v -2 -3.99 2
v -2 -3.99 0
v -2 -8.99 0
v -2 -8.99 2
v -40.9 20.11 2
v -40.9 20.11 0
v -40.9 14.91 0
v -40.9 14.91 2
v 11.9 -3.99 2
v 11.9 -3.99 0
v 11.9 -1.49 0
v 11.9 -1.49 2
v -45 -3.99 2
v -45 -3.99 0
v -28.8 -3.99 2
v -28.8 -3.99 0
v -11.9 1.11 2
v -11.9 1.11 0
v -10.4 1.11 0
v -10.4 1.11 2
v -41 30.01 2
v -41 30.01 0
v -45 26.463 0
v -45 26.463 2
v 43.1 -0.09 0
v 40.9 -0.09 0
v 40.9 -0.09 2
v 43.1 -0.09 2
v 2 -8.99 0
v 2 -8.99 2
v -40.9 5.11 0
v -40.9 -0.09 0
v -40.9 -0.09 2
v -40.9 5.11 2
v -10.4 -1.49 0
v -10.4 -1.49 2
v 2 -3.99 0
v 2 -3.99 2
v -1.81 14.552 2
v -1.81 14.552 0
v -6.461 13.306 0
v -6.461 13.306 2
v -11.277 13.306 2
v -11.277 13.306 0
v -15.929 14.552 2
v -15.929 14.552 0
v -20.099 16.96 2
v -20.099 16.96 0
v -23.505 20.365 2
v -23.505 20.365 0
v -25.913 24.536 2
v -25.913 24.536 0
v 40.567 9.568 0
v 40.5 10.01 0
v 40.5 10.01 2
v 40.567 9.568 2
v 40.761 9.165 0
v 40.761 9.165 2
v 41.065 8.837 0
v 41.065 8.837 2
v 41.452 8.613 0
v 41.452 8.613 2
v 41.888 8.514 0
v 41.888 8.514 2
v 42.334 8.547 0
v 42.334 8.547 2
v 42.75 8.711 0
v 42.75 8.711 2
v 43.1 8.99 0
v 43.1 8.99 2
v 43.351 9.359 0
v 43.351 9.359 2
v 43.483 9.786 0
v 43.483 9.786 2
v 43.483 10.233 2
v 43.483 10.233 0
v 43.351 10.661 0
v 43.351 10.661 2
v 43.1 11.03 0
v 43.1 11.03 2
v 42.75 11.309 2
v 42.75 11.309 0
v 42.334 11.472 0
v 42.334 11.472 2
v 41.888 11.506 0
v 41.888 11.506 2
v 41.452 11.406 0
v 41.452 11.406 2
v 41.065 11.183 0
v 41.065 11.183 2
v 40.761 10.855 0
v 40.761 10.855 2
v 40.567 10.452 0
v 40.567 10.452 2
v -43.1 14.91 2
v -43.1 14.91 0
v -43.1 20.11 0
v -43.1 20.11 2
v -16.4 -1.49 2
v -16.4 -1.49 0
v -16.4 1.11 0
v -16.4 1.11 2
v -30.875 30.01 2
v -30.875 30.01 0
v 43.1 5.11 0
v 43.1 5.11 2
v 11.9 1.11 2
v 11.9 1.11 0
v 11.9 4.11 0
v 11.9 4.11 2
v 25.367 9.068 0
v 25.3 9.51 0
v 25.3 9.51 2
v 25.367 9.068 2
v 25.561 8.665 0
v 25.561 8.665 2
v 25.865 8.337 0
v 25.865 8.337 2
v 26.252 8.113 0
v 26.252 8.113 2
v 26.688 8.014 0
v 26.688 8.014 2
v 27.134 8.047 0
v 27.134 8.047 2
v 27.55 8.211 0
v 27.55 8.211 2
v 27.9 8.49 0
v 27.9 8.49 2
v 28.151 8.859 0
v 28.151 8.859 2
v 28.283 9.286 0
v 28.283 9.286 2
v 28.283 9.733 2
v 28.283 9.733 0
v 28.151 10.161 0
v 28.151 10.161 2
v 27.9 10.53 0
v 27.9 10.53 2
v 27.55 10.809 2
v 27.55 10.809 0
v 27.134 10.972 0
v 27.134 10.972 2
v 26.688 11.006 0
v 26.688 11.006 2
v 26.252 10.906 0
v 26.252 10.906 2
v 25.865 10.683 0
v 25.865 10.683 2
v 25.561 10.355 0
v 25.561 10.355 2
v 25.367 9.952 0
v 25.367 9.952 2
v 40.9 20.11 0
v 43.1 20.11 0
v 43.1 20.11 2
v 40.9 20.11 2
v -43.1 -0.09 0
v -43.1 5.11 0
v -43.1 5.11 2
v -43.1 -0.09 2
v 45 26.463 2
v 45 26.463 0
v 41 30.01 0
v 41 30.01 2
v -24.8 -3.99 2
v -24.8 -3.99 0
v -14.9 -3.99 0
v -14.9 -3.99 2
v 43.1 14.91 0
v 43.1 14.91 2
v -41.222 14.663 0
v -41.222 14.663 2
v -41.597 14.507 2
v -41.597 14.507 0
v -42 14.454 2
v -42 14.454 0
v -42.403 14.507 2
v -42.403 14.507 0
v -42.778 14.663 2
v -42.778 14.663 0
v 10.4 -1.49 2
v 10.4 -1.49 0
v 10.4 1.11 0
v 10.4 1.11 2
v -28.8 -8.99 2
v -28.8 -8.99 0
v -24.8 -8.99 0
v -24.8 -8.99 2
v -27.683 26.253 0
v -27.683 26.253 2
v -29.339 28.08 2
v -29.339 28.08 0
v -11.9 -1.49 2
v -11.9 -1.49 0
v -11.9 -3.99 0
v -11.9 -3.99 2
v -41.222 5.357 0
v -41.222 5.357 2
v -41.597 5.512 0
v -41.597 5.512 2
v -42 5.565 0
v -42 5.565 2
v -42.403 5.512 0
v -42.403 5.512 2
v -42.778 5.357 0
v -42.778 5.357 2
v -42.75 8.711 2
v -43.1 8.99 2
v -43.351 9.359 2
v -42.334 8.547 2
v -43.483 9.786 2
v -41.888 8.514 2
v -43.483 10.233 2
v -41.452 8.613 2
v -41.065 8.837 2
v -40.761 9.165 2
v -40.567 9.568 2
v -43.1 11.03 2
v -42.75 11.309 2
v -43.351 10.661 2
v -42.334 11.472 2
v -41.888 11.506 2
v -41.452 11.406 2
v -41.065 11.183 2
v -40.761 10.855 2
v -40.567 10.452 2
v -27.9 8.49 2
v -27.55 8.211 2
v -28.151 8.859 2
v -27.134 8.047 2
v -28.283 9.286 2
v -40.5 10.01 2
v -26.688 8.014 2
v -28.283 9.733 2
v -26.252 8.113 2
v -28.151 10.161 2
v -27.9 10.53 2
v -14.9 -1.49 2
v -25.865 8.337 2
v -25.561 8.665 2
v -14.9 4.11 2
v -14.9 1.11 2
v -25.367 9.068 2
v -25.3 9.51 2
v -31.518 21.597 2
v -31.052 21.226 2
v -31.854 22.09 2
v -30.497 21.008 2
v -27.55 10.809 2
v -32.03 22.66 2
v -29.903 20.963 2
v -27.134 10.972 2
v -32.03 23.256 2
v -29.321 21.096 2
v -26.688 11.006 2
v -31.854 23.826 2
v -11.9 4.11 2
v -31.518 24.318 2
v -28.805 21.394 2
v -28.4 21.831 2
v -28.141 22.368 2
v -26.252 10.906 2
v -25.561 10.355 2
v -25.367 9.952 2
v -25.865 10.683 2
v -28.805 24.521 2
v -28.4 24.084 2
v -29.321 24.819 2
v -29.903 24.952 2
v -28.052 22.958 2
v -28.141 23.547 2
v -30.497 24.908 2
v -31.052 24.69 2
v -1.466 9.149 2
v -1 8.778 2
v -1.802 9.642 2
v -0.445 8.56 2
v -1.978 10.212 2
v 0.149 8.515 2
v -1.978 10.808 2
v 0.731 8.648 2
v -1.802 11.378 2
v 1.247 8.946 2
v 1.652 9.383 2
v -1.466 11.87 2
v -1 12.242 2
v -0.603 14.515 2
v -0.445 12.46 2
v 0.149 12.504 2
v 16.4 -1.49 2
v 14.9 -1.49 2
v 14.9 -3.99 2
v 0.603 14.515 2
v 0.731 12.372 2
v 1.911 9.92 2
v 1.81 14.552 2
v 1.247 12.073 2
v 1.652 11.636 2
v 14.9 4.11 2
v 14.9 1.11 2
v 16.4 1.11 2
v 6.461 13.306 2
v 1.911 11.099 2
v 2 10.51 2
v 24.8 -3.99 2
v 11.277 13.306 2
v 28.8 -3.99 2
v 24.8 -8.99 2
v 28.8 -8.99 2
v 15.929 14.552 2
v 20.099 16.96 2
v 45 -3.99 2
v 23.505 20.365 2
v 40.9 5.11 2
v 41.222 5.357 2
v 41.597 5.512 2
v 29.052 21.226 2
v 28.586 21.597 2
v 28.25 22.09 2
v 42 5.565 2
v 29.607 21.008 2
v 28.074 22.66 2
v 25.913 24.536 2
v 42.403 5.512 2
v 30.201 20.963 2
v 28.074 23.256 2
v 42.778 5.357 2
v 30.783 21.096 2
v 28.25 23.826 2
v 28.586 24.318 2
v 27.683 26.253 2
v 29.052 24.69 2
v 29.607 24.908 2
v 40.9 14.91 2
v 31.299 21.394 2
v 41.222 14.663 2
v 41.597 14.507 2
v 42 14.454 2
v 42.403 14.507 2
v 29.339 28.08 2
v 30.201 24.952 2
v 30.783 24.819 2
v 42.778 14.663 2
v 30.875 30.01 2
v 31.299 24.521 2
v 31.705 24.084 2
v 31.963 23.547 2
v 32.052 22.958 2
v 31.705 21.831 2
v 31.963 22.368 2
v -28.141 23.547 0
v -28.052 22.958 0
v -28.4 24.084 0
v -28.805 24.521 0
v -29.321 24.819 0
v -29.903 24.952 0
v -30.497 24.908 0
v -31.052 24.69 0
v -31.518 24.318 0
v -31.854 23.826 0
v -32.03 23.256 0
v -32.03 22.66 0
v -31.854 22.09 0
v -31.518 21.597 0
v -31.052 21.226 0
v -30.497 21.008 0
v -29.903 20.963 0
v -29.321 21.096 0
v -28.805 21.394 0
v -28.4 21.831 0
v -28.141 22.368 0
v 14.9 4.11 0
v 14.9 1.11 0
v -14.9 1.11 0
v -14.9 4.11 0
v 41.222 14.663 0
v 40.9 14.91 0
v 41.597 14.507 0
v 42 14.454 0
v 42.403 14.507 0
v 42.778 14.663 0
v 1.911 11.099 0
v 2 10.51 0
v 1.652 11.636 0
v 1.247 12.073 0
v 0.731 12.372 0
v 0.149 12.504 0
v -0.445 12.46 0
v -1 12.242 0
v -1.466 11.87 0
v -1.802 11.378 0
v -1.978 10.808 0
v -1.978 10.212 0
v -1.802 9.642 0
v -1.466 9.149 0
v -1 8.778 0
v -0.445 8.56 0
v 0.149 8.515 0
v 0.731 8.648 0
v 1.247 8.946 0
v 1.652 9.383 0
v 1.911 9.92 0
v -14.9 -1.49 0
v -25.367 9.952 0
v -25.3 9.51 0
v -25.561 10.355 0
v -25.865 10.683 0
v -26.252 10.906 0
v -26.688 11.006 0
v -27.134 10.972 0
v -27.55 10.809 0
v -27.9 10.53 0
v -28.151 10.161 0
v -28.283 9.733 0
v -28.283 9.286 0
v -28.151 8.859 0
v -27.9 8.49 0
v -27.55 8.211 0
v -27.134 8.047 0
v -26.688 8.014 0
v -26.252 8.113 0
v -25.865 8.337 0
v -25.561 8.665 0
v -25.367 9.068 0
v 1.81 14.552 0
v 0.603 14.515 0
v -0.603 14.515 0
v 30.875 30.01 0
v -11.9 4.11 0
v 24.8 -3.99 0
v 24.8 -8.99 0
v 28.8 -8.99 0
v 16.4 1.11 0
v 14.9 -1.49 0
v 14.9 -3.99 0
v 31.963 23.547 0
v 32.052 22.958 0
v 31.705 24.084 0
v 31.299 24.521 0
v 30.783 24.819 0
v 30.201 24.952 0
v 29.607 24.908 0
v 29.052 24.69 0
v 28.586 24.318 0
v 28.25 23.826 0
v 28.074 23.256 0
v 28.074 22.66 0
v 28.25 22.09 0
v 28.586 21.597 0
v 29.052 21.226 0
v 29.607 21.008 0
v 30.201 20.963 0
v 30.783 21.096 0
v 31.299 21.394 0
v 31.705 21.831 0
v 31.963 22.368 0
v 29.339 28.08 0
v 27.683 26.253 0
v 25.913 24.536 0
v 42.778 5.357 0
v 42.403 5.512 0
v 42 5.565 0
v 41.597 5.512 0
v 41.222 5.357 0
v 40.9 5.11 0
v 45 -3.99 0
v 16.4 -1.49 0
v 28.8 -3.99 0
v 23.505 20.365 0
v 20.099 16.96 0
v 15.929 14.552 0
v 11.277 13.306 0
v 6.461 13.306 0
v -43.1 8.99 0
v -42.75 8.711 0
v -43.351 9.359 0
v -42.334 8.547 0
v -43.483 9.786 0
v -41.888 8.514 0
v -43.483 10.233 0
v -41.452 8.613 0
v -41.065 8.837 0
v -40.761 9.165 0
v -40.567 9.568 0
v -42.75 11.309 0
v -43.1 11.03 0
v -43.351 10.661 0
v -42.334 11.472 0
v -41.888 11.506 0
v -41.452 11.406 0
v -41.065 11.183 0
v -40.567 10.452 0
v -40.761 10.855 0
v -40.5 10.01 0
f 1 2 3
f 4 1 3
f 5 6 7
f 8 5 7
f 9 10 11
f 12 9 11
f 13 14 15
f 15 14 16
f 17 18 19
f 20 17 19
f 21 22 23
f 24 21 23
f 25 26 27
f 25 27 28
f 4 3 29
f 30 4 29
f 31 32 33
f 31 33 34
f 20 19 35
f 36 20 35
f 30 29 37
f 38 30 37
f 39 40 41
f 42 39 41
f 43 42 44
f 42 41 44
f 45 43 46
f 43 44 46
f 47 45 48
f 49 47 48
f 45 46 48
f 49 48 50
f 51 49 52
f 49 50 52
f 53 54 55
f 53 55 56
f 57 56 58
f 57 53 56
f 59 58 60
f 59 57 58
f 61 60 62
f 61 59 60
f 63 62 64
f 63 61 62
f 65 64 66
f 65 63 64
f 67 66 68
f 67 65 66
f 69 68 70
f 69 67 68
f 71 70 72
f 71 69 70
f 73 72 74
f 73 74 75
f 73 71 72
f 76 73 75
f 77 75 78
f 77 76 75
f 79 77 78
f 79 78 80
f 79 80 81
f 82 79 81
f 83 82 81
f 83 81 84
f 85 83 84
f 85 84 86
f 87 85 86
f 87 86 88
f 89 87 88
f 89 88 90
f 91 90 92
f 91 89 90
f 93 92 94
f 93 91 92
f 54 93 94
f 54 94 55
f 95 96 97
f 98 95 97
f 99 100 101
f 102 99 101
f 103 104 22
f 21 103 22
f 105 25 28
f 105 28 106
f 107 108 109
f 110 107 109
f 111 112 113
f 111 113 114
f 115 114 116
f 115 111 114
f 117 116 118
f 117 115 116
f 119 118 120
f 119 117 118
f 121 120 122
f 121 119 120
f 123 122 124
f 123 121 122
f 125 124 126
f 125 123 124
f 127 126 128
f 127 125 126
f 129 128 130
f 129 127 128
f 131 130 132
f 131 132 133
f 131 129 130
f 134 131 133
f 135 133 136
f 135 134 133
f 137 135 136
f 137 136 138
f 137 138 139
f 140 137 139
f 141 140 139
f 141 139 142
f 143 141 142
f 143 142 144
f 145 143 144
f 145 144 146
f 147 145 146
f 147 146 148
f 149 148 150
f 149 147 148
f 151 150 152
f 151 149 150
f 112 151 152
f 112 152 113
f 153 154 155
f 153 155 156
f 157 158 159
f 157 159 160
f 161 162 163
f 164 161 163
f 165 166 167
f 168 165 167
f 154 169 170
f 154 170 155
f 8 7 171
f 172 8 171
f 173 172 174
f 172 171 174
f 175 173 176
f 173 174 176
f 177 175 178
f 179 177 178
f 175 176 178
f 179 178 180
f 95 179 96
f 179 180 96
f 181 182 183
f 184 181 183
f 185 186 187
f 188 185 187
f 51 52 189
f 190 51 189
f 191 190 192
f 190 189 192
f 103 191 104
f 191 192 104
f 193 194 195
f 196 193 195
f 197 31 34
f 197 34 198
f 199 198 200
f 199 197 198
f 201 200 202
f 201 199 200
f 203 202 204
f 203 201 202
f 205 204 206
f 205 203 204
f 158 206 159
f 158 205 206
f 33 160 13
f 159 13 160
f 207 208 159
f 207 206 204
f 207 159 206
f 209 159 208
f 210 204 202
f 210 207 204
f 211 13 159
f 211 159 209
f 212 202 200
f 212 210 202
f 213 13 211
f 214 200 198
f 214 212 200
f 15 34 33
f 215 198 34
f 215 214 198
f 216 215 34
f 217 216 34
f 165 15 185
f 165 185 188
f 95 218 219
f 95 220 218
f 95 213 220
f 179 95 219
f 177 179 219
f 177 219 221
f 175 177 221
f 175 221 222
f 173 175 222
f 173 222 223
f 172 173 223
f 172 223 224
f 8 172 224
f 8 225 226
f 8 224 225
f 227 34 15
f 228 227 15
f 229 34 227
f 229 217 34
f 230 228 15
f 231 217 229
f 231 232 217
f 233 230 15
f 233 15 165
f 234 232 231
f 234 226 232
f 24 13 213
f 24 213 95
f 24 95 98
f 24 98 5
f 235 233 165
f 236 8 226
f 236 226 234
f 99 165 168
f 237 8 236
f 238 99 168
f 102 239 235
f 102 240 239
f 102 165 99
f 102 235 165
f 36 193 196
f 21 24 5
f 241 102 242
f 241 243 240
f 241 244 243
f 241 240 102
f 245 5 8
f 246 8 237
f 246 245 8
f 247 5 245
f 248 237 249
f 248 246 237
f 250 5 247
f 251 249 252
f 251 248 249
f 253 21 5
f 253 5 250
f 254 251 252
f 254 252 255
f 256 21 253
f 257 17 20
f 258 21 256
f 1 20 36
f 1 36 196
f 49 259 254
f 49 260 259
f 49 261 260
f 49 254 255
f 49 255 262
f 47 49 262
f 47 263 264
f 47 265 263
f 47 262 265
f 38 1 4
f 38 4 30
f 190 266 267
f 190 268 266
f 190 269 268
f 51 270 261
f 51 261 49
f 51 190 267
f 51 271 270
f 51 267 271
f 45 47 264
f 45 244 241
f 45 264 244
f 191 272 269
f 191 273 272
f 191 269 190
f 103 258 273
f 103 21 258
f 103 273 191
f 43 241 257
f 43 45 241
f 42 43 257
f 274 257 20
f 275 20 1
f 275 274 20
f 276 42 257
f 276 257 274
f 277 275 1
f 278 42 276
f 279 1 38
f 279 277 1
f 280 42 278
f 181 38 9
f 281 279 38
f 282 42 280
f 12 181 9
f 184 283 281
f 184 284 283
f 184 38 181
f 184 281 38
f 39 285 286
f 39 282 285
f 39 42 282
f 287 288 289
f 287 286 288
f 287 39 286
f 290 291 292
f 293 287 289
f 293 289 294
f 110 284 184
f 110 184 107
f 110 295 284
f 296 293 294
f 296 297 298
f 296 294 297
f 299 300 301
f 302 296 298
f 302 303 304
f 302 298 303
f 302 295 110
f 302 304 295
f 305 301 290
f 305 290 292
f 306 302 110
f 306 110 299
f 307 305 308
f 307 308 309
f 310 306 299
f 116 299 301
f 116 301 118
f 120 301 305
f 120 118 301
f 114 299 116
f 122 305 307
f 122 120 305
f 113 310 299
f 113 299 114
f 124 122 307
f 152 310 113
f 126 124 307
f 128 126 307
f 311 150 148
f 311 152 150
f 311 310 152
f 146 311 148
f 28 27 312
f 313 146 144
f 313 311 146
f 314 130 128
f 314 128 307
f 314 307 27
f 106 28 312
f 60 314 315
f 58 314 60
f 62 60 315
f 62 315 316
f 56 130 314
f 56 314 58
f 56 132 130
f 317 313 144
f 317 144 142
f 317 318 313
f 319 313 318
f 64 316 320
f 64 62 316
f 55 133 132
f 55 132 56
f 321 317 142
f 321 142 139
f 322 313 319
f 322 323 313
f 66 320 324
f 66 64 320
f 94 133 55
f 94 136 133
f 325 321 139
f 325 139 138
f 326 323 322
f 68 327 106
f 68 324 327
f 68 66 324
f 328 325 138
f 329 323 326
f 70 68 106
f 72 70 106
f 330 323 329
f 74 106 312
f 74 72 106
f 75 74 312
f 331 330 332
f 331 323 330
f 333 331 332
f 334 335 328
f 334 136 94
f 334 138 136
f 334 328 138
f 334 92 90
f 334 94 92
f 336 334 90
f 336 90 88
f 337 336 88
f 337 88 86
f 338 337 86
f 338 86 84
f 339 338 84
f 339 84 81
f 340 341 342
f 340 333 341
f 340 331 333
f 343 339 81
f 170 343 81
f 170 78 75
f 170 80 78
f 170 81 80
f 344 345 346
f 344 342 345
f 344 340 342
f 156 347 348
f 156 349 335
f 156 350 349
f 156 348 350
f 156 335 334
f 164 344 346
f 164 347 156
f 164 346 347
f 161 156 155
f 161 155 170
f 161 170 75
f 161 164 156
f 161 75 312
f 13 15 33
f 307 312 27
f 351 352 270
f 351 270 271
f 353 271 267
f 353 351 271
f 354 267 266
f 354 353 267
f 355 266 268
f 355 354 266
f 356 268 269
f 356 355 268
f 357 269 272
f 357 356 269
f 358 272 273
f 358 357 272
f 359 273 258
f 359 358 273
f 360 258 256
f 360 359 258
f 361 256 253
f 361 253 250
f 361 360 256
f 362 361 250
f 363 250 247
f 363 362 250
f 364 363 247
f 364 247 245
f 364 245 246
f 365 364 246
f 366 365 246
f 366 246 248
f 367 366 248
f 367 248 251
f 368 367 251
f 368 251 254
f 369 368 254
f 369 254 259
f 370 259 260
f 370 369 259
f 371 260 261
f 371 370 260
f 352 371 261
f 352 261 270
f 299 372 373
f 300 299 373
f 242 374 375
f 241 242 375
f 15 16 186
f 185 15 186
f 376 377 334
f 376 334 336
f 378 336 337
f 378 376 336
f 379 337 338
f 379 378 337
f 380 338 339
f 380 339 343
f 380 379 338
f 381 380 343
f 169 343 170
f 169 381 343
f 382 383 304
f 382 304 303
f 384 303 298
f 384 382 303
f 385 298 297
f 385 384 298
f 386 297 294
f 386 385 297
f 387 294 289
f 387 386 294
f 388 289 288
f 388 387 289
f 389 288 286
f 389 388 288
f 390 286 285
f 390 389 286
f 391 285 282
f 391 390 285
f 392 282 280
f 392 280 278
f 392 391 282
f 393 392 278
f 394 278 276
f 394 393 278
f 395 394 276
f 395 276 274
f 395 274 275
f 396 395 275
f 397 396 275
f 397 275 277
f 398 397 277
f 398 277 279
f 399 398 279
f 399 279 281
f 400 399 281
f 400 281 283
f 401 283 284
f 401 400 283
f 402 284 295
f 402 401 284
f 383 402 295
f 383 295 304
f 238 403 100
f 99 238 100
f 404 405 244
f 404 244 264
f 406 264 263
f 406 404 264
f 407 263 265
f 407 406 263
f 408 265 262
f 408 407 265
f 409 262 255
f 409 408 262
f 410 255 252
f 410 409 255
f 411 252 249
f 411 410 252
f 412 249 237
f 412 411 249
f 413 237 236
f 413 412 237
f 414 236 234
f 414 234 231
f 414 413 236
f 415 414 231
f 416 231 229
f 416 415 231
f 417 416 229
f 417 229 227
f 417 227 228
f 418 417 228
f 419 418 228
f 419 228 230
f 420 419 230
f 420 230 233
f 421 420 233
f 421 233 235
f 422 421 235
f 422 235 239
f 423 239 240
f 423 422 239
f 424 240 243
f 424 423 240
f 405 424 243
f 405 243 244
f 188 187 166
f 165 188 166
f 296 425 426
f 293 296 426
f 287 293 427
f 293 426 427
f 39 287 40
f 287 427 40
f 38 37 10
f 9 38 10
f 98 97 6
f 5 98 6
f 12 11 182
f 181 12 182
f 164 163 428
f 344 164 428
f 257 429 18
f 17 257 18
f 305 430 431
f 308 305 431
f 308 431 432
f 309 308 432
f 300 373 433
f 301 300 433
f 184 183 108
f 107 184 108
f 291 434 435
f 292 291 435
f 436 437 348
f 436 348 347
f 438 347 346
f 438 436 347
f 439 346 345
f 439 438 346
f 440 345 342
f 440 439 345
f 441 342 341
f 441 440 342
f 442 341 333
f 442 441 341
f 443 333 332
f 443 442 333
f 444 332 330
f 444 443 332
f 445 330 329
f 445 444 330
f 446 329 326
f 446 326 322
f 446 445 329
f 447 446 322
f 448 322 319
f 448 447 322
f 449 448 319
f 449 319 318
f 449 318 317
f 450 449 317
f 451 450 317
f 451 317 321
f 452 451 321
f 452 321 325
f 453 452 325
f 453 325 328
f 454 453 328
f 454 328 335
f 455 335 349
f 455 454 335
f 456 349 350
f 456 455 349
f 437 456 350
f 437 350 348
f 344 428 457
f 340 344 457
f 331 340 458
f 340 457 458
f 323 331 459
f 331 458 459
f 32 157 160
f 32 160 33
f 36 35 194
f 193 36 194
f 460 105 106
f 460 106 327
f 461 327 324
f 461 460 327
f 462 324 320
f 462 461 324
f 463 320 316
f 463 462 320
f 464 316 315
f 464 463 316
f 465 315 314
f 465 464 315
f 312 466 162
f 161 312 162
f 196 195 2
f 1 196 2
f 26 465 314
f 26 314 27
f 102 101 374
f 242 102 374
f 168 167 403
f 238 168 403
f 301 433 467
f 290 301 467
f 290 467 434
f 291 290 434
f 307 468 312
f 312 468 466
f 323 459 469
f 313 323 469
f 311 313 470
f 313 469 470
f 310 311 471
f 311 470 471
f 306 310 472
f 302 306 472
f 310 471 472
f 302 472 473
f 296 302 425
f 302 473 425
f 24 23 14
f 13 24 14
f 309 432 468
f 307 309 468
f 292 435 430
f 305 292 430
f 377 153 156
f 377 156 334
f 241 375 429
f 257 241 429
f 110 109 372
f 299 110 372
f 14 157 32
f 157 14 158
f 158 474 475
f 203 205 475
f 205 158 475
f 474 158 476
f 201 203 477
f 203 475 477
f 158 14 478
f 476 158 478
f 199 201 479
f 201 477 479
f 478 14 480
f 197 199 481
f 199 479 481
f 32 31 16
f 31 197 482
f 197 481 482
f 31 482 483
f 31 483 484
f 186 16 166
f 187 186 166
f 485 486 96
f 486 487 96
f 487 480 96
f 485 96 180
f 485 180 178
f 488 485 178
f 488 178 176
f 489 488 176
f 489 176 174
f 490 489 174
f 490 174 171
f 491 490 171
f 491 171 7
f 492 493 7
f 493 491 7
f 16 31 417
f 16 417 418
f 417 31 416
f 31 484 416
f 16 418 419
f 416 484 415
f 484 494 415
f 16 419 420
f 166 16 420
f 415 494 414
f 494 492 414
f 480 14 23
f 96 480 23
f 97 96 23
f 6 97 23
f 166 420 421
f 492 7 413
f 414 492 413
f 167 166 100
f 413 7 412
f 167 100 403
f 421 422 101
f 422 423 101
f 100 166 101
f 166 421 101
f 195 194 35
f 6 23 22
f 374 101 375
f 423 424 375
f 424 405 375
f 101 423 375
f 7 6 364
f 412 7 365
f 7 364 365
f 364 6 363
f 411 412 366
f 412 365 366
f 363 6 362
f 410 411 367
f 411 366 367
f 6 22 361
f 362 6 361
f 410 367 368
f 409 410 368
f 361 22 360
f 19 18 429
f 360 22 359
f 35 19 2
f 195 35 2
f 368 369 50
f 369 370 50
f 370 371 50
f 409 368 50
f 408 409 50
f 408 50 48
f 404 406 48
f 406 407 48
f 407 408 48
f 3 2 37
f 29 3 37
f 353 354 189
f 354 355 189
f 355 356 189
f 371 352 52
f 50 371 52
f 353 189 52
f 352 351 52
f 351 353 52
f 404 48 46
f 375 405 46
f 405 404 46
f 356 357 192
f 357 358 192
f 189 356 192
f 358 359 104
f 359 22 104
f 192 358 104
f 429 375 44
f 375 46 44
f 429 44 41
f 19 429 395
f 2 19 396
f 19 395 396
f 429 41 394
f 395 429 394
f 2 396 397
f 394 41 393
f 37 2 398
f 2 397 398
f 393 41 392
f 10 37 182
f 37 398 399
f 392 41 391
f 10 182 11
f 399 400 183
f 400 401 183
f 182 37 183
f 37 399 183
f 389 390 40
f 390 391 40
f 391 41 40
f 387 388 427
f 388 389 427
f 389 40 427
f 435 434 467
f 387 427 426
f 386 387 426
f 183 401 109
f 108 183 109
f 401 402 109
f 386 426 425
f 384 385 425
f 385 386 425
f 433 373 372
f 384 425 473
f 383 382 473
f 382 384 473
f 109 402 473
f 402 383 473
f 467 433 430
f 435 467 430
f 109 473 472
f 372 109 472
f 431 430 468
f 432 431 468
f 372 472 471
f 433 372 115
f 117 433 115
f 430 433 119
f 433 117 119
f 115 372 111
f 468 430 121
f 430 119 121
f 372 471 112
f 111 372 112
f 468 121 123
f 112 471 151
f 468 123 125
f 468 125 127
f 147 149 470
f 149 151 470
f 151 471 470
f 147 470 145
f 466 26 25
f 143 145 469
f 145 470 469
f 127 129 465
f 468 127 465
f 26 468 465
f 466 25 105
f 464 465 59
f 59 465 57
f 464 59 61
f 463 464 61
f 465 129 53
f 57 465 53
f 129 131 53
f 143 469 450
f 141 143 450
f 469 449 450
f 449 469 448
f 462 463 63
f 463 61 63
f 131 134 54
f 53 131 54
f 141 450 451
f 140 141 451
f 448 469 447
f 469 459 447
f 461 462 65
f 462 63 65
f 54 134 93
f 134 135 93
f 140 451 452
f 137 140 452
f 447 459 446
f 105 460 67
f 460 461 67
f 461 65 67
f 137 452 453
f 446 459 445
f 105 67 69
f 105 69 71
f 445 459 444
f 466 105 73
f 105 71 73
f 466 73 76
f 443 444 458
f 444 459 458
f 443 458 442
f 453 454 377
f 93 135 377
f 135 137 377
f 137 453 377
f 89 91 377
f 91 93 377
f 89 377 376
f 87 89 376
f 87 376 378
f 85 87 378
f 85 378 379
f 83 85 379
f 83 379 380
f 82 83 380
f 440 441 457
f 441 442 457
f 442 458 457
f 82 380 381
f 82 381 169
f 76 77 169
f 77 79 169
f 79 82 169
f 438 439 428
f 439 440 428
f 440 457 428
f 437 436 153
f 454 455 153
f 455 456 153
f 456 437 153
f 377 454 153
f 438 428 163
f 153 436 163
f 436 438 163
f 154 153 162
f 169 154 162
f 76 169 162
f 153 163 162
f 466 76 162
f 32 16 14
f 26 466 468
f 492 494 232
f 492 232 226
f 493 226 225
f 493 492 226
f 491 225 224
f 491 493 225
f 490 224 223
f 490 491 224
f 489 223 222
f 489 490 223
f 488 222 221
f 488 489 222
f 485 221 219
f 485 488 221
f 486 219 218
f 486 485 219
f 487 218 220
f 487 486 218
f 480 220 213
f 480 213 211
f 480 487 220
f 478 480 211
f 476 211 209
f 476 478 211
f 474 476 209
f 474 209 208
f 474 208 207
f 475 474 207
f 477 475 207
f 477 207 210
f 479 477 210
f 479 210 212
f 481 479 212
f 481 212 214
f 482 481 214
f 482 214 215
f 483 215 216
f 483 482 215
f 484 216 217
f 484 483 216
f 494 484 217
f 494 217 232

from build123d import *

# Parameters (mm, degrees)
SKETCH_3_R      = 2
SKETCH_3_R_2    = 1.5
EXTRUDE_1_DEPTH = 2


with BuildPart() as part:
    # 草图3 → 凸台-拉伸1 (new body)
    with BuildSketch(Plane.XY):
        with BuildLine():
            Line((-45, -3.990216685), (-28.8, -3.990216685))
            Line((-28.8, -3.990216685), (-28.8, -8.990216685))
            Line((-28.8, -8.990216685), (-24.8, -8.990216685))
            Line((-24.8, -8.990216685), (-24.8, -3.990216685))
            Line((-24.8, -3.990216685), (-14.9, -3.990216685))
            Line((-14.9, -3.990216685), (-14.9, -1.490216685))
            Line((-14.9, -1.490216685), (-16.4, -1.490216685))
            Line((-16.4, -1.490216685), (-16.4, 1.109783315))
            Line((-16.4, 1.109783315), (-14.9, 1.109783315))
            Line((-14.9, 1.109783315), (-14.9, 4.109783315))
            Line((-14.9, 4.109783315), (-11.9, 4.109783315))
            Line((-11.9, 4.109783315), (-11.9, 1.109783315))
            Line((-11.9, 1.109783315), (-10.4, 1.109783315))
            Line((-10.4, 1.109783315), (-10.4, -1.490216685))
            Line((-10.4, -1.490216685), (-11.9, -1.490216685))
            Line((-11.9, -1.490216685), (-11.9, -3.990216685))
            Line((-11.9, -3.990216685), (-2, -3.990216685))
            Line((-2, -3.990216685), (-2, -8.990216685))
            Line((-2, -8.990216685), (0, -8.990216685))
            Line((0, -8.990216685), (2, -8.990216685))
            Line((2, -8.990216685), (2, -3.990216685))
            Line((2, -3.990216685), (11.9, -3.990216685))
            Line((11.9, -3.990216685), (11.9, -1.490216685))
            Line((11.9, -1.490216685), (10.4, -1.490216685))
            Line((10.4, -1.490216685), (10.4, 1.109783315))
            Line((10.4, 1.109783315), (11.9, 1.109783315))
            Line((11.9, 1.109783315), (11.9, 4.109783315))
            Line((11.9, 4.109783315), (14.9, 4.109783315))
            Line((14.9, 4.109783315), (14.9, 1.109783315))
            Line((14.9, 1.109783315), (16.4, 1.109783315))
            Line((16.4, 1.109783315), (16.4, -1.490216685))
            Line((16.4, -1.490216685), (14.9, -1.490216685))
            Line((14.9, -1.490216685), (14.9, -3.990216685))
            Line((14.9, -3.990216685), (24.8, -3.990216685))
            Line((24.8, -3.990216685), (24.8, -8.990216685))
            Line((24.8, -8.990216685), (28.8, -8.990216685))
            Line((28.8, -8.990216685), (28.8, -3.990216685))
            Line((28.8, -3.990216685), (45, -3.990216685))
            Line((45, -3.990216685), (45, 5.009783315))
            Line((45, 5.009783315), (45, 15.009783315))
            Line((45, 15.009783315), (45, 26.463053661))
            Line((45, 26.463053661), (41, 30.009783315))
            Line((41, 30.009783315), (30.874746963, 30.009783315))
            ThreePointArc((30.874746963, 30.009783315), (28.525350528, 27.153364822), (25.912710857, 24.535559602))
            ThreePointArc((25.912710857, 24.535559602), (15.928828372, 14.55206683), (1.809761925, 14.552342399))
            ThreePointArc((1.809761925, 14.552342399), (0, 14.509783315), (-1.809761925, 14.552342399))
            ThreePointArc((-1.809761925, 14.552342399), (-15.928828372, 14.55206683), (-25.912710857, 24.535559602))
            ThreePointArc((-25.912710857, 24.535559602), (-28.525350528, 27.153364822), (-30.874746963, 30.009783315))
            Line((-30.874746963, 30.009783315), (-41, 30.009783315))
            Line((-41, 30.009783315), (-45, 26.463053661))
            Line((-45, 26.463053661), (-45, 15.009783315))
            Line((-45, 15.009783315), (-45, 5.009783315))
            Line((-45, 5.009783315), (-45, -3.990216685))
        make_face()
        with Locations((0, 10.509783315)):
            Circle(SKETCH_3_R, mode=Mode.SUBTRACT)
        with Locations((-30.0520382, 22.957745114)):
            Circle(SKETCH_3_R, mode=Mode.SUBTRACT)
        with Locations((30.0520382, 22.957745114)):
            Circle(SKETCH_3_R, mode=Mode.SUBTRACT)
        with Locations((-26.8, 9.509783315)):
            Circle(SKETCH_3_R_2, mode=Mode.SUBTRACT)
        with Locations(Location((26.8, 9.509783315, 0), (0, 0, 180))):
            Circle(SKETCH_3_R_2, mode=Mode.SUBTRACT)
        with Locations((-42, 10.009783315)):
            Circle(SKETCH_3_R_2, mode=Mode.SUBTRACT)
        with Locations(Location((42, 10.009783315, 0), (0, 0, 180))):
            Circle(SKETCH_3_R_2, mode=Mode.SUBTRACT)
        with BuildLine():
            Line((-43.1, 5.109783315), (-43.1, -0.090216685))
            Line((-43.1, -0.090216685), (-40.9, -0.090216685))
            Line((-40.9, -0.090216685), (-40.9, 5.109783315))
            ThreePointArc((-40.9, 5.109783315), (-42, 5.565418233), (-43.1, 5.109783315))
        make_face(mode=Mode.SUBTRACT)
        with BuildLine():
            Line((-43.1, 20.109783315), (-40.9, 20.109783315))
            Line((-40.9, 20.109783315), (-40.9, 14.909783315))
            ThreePointArc((-40.9, 14.909783315), (-42, 14.454148396), (-43.1, 14.909783315))
            Line((-43.1, 14.909783315), (-43.1, 20.109783315))
        make_face(mode=Mode.SUBTRACT)
        with BuildLine():
            Line((40.9, 20.109783315), (40.9, 14.909783315))
            ThreePointArc((40.9, 14.909783315), (42, 14.454148396), (43.1, 14.909783315))
            Line((43.1, 14.909783315), (43.1, 20.109783315))
            Line((43.1, 20.109783315), (40.9, 20.109783315))
        make_face(mode=Mode.SUBTRACT)
        with BuildLine():
            Line((40.9, 5.109783315), (40.9, -0.090216685))
            Line((40.9, -0.090216685), (43.1, -0.090216685))
            Line((43.1, -0.090216685), (43.1, 5.109783315))
            ThreePointArc((43.1, 5.109783315), (42, 5.565418233), (40.9, 5.109783315))
        make_face(mode=Mode.SUBTRACT)
    extrude(amount=EXTRUDE_1_DEPTH)


solid = part.part
